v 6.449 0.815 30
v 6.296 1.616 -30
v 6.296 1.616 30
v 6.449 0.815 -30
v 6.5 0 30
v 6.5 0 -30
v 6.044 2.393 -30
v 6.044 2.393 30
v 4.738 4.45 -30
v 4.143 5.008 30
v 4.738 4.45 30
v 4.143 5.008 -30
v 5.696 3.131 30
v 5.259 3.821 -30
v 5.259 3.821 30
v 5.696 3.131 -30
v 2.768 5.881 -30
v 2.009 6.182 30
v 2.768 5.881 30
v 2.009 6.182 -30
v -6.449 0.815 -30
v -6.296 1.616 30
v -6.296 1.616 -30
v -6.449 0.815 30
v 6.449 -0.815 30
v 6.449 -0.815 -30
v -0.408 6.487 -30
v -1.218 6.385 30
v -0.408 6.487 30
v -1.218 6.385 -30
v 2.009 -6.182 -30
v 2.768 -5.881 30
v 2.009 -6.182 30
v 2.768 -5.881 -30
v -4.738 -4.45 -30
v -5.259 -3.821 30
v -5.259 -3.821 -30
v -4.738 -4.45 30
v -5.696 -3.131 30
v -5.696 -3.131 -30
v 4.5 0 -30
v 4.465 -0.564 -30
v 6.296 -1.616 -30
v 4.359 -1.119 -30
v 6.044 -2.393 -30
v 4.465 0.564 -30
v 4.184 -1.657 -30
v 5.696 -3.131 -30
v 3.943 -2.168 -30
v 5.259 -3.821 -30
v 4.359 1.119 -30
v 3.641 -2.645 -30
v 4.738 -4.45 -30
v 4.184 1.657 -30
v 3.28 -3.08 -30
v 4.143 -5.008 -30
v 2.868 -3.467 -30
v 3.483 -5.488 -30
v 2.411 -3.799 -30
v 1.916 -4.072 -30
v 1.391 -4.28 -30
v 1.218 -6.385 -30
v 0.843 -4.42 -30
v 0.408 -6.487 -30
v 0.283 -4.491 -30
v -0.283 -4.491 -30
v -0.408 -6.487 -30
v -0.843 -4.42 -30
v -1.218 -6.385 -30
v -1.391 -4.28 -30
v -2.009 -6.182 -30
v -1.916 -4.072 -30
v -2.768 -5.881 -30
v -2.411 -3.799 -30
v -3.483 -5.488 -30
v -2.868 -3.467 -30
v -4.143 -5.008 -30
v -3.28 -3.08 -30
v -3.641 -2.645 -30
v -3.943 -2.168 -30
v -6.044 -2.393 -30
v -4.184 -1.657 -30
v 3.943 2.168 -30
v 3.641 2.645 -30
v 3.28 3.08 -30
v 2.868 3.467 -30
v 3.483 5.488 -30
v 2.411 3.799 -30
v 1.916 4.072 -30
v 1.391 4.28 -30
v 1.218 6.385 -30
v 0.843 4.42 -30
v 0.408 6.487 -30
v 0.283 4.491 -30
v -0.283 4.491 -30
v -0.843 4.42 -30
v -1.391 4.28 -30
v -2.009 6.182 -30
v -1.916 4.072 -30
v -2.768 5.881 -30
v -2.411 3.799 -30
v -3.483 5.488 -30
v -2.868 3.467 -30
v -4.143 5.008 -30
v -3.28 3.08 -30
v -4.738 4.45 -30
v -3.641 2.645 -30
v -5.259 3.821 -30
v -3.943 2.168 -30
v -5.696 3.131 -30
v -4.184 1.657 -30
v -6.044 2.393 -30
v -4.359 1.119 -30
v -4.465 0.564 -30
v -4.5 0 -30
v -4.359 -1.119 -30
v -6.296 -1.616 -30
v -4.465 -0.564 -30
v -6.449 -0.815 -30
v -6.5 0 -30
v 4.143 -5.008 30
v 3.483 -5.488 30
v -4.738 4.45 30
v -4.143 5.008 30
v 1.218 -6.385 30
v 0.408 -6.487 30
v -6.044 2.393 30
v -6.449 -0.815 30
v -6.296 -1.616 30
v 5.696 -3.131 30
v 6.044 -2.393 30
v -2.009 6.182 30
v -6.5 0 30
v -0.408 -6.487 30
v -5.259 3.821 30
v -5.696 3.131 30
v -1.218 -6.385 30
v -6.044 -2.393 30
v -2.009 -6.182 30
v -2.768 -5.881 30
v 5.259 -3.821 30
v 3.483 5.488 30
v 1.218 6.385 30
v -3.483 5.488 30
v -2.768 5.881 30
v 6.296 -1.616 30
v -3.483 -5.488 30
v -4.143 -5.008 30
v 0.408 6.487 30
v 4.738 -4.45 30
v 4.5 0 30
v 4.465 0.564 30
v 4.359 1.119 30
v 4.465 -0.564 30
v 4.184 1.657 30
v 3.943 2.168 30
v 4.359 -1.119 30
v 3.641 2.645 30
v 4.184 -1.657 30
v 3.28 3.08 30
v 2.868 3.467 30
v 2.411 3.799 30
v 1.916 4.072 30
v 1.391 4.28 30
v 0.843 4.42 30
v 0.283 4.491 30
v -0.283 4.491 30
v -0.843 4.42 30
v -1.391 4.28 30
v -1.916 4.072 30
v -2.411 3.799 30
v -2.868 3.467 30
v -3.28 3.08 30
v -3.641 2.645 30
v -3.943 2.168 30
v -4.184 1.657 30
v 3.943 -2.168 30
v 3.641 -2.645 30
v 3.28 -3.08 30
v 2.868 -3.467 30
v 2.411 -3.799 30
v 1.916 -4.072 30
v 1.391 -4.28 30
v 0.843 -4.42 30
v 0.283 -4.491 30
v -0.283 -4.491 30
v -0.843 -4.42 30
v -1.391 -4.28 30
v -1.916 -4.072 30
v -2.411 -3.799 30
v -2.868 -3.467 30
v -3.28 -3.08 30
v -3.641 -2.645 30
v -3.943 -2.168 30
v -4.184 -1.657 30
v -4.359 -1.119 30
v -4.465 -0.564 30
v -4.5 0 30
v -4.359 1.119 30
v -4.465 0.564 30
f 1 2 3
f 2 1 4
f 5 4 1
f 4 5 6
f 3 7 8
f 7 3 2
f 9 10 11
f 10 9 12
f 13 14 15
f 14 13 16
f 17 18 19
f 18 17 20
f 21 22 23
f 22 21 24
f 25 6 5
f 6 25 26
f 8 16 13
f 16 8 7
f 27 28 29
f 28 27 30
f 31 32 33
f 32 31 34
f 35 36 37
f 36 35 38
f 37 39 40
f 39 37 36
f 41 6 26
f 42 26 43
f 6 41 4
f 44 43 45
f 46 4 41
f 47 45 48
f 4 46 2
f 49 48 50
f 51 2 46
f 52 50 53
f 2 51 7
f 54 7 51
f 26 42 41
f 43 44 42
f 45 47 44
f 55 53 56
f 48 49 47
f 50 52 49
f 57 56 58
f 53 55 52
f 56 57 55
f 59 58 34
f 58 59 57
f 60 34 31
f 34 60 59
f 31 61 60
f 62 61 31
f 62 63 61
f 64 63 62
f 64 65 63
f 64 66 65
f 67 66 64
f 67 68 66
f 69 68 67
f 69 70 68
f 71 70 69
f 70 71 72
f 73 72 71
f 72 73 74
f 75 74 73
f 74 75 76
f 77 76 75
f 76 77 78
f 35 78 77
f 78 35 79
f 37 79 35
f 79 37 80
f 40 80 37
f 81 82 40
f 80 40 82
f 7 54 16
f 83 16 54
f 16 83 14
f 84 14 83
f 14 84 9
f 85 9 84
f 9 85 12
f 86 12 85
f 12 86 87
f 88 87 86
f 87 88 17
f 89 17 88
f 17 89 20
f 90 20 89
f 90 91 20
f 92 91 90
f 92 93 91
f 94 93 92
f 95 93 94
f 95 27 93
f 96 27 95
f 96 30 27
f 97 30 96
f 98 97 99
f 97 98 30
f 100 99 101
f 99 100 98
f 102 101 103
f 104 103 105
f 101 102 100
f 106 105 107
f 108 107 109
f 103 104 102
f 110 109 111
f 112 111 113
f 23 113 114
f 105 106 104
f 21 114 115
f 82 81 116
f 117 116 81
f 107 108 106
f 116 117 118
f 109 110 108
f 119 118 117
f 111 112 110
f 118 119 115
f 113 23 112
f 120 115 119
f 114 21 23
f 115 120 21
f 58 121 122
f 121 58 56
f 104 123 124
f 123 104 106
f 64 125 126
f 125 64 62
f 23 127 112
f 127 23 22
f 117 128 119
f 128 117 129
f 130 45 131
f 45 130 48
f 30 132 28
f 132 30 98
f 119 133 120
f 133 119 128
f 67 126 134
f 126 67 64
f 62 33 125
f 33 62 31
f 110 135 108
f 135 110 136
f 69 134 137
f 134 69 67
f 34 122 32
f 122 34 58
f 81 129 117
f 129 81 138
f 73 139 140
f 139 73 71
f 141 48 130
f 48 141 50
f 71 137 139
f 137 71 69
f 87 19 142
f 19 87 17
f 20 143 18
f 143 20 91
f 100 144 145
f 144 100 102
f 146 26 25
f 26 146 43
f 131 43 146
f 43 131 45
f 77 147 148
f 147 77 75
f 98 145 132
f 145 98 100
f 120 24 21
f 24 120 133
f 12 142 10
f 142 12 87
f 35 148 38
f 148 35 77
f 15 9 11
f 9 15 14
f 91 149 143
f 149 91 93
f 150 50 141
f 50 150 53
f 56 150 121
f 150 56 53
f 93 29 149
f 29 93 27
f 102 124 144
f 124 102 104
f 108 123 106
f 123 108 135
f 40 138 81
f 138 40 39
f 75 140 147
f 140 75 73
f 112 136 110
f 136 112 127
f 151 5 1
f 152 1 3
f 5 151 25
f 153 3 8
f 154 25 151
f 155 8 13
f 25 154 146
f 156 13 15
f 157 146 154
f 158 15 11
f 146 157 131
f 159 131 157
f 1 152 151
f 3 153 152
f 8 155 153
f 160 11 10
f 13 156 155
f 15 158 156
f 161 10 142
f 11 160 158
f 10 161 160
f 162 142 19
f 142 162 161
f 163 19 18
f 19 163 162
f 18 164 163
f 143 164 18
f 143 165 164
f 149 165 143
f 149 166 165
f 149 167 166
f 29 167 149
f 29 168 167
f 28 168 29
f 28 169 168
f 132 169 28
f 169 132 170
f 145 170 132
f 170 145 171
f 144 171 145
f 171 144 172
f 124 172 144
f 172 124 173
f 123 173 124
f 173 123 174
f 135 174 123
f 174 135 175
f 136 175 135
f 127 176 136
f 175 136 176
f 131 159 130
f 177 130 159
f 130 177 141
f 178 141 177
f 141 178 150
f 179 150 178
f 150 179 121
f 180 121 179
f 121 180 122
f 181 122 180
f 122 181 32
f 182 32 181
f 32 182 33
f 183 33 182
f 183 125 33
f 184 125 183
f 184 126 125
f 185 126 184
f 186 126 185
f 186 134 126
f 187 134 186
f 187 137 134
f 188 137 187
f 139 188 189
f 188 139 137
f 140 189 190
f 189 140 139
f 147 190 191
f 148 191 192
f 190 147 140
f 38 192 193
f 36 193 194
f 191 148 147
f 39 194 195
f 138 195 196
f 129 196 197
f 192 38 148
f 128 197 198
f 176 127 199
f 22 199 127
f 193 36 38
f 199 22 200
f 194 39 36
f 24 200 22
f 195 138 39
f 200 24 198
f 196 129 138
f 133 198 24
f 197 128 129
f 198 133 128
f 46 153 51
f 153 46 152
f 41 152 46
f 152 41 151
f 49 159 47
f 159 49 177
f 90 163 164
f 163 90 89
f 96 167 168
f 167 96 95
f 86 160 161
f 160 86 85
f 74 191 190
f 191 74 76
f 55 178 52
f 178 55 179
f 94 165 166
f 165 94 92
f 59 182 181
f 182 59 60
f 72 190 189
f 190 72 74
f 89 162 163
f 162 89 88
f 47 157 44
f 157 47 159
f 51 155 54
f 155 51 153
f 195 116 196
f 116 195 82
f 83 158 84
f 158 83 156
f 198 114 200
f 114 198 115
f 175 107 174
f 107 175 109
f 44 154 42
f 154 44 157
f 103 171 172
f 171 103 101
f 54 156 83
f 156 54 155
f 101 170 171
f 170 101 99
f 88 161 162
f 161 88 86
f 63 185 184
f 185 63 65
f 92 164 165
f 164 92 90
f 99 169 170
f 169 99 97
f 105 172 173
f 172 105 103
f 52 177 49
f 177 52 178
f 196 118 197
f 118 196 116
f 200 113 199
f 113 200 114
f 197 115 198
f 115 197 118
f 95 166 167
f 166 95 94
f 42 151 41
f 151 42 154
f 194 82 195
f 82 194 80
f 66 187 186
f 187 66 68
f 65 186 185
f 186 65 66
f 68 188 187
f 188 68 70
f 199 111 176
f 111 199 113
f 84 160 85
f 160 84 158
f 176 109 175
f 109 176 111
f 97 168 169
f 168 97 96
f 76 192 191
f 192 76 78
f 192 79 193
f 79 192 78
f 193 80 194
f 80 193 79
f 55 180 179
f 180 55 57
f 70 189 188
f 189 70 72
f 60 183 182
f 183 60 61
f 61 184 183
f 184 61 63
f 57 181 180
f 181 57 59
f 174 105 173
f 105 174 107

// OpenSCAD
$fn = 50;


difference() {
	union() {
		translate(v = [0, 0, -30.0000000000]) {
			cylinder(h = 60, r = 6.5000000000);
		}
	}
	union() {
		translate(v = [0, 0, -100.0000000000]) {
			cylinder(h = 200, r = 4.5000000000);
		}
	}
}
